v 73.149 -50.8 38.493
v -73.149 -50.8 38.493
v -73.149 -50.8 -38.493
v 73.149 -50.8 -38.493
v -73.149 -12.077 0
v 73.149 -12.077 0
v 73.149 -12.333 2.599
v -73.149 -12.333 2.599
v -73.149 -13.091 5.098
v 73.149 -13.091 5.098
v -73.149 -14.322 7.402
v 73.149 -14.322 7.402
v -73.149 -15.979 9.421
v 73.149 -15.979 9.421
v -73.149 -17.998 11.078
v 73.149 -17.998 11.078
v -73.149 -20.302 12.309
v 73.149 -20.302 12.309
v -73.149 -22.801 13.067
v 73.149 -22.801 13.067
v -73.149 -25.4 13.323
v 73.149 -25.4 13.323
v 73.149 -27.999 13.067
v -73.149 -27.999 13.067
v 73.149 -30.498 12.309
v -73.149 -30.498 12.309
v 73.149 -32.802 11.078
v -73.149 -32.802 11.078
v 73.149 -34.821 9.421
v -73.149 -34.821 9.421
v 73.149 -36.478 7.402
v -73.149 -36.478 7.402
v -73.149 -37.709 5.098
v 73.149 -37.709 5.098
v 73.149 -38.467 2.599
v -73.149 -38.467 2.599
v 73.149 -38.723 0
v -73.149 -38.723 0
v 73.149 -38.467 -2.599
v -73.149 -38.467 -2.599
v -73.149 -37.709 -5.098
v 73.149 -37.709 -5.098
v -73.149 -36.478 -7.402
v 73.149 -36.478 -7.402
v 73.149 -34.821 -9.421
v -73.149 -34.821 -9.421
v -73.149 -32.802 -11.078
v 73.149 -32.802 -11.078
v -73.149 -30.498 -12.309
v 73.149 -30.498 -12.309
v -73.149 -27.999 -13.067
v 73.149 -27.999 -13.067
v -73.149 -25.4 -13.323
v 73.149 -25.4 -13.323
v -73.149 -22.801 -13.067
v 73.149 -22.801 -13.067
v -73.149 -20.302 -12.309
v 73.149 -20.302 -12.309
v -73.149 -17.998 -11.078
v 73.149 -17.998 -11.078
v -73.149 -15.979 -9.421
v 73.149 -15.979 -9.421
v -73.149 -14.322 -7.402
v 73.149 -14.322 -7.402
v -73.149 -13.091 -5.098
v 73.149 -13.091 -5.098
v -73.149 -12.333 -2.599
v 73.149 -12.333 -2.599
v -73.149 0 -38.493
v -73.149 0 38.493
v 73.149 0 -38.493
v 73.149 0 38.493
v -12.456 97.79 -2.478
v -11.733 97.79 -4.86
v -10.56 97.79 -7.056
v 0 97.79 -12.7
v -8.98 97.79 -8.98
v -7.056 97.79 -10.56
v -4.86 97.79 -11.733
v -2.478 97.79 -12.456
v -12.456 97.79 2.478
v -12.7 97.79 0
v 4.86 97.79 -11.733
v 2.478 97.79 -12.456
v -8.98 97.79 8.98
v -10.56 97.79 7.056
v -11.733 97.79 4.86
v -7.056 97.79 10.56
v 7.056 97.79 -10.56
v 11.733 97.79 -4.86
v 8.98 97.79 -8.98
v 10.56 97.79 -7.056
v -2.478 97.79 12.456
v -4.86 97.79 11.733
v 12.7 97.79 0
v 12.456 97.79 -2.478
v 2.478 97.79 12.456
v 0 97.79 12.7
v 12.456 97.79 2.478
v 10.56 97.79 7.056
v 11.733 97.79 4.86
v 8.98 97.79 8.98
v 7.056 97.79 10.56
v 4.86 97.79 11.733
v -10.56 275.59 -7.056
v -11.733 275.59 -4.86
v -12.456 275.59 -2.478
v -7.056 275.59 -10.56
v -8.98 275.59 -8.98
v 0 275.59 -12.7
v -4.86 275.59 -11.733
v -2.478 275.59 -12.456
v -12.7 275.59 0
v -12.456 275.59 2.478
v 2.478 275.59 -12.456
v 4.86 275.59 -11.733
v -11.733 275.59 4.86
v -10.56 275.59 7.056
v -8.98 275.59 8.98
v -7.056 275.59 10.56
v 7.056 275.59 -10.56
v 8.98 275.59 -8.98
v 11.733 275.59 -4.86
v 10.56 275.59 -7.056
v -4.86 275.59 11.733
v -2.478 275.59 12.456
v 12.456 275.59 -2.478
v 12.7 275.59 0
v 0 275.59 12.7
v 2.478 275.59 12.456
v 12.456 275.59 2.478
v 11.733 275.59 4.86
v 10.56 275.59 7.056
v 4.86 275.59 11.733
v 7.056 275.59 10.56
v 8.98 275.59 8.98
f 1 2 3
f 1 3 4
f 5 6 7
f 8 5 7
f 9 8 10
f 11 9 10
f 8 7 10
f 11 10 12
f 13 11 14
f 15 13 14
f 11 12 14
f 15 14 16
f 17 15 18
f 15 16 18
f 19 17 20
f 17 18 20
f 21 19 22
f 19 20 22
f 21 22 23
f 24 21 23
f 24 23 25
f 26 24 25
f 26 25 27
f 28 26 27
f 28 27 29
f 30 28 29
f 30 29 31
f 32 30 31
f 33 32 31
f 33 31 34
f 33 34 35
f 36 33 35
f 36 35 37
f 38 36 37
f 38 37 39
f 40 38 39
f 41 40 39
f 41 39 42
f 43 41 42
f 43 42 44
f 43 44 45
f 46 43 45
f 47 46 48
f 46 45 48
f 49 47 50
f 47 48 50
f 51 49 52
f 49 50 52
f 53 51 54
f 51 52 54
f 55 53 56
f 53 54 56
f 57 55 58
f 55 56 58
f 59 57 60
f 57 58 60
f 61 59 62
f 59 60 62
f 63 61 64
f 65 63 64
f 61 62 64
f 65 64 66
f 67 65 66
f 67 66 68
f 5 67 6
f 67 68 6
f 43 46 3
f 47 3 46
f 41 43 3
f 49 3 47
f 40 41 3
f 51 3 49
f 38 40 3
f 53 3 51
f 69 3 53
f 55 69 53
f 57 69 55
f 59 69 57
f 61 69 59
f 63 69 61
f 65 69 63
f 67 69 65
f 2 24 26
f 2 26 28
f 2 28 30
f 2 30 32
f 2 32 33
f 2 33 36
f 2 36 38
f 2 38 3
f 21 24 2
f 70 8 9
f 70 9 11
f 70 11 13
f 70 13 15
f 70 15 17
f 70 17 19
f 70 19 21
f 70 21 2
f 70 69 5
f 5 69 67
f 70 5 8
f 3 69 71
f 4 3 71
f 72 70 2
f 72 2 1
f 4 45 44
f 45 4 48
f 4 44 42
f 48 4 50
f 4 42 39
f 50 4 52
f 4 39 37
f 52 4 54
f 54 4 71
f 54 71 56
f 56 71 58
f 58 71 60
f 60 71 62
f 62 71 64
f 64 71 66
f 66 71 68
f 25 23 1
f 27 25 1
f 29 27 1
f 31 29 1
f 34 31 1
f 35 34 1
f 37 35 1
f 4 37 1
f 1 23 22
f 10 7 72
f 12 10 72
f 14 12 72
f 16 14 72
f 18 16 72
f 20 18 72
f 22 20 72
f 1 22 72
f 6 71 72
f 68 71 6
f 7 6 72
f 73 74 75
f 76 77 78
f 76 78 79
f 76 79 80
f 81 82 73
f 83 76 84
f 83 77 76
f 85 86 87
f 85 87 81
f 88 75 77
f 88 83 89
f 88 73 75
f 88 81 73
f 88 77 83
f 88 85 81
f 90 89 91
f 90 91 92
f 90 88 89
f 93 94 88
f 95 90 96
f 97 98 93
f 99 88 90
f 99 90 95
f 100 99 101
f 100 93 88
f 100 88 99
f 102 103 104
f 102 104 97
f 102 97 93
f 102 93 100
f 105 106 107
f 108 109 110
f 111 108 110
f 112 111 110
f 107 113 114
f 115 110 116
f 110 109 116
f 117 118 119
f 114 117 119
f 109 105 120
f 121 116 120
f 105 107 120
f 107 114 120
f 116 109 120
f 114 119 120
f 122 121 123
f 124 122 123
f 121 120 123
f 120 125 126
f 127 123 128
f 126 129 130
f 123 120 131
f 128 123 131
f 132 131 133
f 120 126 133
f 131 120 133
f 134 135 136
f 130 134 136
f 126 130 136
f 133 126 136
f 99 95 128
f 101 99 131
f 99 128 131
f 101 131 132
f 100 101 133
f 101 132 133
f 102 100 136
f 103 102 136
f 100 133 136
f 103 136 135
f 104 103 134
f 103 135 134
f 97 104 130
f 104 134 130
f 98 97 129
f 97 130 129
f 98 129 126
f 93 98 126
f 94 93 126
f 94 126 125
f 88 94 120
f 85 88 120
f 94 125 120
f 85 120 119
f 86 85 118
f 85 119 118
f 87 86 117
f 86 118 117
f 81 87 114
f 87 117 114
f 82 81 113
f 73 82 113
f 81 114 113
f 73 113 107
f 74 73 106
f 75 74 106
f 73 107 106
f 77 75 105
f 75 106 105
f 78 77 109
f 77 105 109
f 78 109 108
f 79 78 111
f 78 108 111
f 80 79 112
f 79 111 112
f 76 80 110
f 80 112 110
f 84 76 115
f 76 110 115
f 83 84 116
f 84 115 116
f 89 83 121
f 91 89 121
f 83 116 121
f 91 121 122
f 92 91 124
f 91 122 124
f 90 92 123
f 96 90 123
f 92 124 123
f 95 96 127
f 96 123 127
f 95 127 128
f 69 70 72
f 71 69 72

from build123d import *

# Parameters (mm, degrees)
F0_W     = 146.29735
F0_H     = 76.986366
F1_DEPTH = 50.8
F2_R     = 13.322924
F3_DEPTH = 228.6
F5_R     = 12.7
F6_DEPTH = 177.8


with BuildPart() as f1:
    # F0 (on Front) → F1 (new body)
    with BuildSketch(Plane.XZ):
        Rectangle(F0_W, F0_H)
    extrude(amount=F1_DEPTH)

    # F2 (on face) → F3 (cut)
    with BuildSketch(Plane.YZ.offset(73.148675)):
        with Locations((-25.4, 0)):
            Circle(F2_R)
    extrude(amount=-F3_DEPTH, mode=Mode.SUBTRACT)


with BuildPart() as f6:
    # F5 (on offset) → F6 (new body)
    with BuildSketch(Plane.XZ.offset(-275.59)):
        Circle(F5_R)
    extrude(amount=F6_DEPTH)


solid = Compound([f1.part, f6.part])
